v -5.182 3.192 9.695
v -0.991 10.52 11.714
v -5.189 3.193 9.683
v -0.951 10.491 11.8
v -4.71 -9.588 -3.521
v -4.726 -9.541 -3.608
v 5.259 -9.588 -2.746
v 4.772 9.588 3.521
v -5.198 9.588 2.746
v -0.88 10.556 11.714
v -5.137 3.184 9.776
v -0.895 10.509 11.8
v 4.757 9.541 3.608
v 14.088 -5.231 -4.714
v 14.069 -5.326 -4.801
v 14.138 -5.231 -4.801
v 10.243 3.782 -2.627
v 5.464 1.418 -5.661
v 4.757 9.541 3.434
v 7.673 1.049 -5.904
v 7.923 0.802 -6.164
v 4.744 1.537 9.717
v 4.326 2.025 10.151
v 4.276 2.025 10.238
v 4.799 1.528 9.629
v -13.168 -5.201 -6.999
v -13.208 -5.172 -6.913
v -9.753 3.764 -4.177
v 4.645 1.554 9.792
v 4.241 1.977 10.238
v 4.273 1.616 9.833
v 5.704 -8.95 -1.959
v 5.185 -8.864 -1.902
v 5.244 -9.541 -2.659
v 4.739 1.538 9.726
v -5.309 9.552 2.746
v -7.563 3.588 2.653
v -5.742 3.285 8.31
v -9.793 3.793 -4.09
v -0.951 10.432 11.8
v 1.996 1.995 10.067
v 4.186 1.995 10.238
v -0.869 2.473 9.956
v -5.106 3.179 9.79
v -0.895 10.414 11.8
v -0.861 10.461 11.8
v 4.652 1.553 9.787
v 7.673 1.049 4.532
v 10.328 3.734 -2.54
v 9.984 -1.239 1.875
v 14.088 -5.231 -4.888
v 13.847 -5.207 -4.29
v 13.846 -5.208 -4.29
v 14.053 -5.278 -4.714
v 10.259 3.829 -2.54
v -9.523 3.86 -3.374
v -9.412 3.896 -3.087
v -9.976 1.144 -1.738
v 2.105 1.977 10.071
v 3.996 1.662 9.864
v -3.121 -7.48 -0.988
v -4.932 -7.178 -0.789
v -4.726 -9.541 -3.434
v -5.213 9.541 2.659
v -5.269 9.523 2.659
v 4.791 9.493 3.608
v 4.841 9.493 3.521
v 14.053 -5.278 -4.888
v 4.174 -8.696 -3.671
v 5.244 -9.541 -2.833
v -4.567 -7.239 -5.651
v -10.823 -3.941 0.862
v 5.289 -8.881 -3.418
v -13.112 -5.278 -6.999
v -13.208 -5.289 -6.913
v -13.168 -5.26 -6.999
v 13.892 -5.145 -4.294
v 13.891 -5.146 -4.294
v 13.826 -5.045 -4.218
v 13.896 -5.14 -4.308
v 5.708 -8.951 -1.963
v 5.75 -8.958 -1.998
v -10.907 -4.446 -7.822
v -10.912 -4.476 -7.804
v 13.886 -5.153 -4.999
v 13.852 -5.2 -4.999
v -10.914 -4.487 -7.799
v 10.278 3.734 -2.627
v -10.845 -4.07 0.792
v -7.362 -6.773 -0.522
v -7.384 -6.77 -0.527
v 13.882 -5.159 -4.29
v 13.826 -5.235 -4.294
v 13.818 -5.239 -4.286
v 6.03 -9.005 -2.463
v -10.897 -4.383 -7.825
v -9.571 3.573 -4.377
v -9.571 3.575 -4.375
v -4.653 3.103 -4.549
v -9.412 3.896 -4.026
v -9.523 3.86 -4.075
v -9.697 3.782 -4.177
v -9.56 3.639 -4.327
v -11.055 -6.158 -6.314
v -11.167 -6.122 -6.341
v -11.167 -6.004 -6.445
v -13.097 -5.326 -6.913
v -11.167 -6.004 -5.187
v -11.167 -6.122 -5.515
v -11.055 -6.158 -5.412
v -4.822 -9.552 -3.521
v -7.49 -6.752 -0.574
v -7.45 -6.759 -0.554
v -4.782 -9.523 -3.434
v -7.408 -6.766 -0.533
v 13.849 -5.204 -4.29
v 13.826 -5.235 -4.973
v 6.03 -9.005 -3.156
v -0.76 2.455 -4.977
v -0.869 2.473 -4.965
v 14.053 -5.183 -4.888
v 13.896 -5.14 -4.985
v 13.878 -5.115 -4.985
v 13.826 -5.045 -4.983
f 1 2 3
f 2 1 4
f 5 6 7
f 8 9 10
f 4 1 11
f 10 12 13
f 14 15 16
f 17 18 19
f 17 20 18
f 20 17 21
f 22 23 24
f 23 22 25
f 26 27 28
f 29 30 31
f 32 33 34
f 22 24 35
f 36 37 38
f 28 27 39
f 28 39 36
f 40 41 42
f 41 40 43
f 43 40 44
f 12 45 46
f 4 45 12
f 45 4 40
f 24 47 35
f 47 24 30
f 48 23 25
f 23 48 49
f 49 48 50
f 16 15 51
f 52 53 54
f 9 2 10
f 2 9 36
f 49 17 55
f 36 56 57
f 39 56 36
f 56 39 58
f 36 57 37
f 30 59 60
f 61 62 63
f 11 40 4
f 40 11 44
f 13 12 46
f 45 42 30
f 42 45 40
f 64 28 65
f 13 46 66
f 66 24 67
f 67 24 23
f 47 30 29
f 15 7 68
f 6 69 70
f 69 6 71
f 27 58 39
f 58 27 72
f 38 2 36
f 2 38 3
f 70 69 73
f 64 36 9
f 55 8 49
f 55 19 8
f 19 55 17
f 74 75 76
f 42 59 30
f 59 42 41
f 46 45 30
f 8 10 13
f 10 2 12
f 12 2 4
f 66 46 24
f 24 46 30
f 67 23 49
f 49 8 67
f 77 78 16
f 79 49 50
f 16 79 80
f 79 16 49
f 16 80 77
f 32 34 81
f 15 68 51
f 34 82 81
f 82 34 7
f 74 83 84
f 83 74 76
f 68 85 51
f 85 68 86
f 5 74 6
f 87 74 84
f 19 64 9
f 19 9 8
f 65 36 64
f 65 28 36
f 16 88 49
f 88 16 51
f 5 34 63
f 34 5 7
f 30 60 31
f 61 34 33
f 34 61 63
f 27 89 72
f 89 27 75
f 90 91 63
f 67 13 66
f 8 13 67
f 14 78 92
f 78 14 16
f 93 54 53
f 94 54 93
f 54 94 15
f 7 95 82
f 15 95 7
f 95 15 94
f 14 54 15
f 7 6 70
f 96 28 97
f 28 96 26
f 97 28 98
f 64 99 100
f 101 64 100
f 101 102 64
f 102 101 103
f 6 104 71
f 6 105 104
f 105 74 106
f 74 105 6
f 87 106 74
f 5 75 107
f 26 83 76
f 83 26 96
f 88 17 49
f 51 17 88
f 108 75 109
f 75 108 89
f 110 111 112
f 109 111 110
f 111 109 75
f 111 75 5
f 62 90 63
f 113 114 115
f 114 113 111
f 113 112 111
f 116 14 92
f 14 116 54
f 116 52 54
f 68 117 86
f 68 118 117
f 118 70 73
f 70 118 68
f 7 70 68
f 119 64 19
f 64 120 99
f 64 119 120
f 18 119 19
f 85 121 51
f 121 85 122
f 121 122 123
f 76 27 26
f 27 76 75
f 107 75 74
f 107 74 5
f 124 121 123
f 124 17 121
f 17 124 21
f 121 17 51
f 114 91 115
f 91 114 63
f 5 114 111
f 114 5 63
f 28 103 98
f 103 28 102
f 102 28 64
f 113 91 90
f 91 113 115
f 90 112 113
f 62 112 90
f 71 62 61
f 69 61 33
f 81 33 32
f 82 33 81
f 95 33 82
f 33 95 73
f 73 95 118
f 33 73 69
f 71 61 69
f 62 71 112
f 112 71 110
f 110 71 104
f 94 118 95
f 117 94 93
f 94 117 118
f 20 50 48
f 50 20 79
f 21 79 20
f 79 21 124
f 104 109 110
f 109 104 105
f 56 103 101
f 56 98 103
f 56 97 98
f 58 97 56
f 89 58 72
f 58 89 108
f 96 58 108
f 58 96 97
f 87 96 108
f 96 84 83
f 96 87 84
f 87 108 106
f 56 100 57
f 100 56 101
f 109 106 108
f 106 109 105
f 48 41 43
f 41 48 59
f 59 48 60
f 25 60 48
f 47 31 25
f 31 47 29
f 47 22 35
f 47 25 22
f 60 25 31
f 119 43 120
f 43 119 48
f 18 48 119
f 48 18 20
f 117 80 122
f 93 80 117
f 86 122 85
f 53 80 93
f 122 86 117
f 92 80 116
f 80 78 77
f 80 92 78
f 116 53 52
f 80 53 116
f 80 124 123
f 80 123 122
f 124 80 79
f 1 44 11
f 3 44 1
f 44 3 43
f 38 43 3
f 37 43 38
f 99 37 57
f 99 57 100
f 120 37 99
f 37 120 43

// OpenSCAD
// Auto-generated OpenSCAD file

    inner_points = 10*[[0.599886064142325, -0.8909680205958462, -0.5000000000000165], [0.7642449049774599, 0.095432593474994, -0.500000000000021], [-1.1086099160454883, -0.6062901575962651, 0.500000000000021], [-0.9442510752103533, 0.3801104564745751, 0.5000000000000165], [0.599886064142347, -0.8909680205958453, 0.4999999999999834], [0.764244904977482, 0.09543259347499483, 0.49999999999997896], [-0.2543619259516038, -0.7486290890960565, -0.9999999999999978], [-0.09000308511646875, 0.23777152497478365, -1.0000000000000022], [-0.2543619259515596, -0.7486290890960547, 1.0000000000000022], [-0.09000308511642456, 0.23777152497478538, 0.9999999999999978], [-1.1086099160455103, -0.606290157596266, -0.49999999999997896], [-0.9442510752103753, 0.3801104564745742, -0.4999999999999834], [1.3795560477359692, -0.51398696446291, -3.397282455352979e-14], [-0.9480517821689757, -0.12614969085949718, 1.3623724356958116], [-0.948051782169036, -0.12614969085949948, -1.3623724356957776]];

    outer_points = 10*[[-1.0227603980993214, -0.3734255004598836, 0.25399717259450516], [-0.9712245325180885, 0.3734255004598836, -0.40899425795639943], [0.9712245325180885, -0.3734255004598836, 0.40899425795639943], [1.0227603980993214, 0.3734255004598836, -0.25399717259450516], [-0.47413873270521345, -0.9493249594098434, -0.3521002465068624], [-0.4226028671239805, -0.20247395849007616, -1.0150916770577671], [-0.5743895981847245, 0.20247395849007616, 0.9375931343768199], [-0.5228537326034916, 0.9493249594098434, 0.27460170382591526], [0.5228537326034916, -0.9493249594098434, -0.27460170382591526], [0.5743895981847245, -0.20247395849007616, -0.9375931343768199], [0.4226028671239805, 0.20247395849007616, 1.0150916770577671], [0.47413873270521345, 0.9493249594098434, 0.3521002465068624], [-1.312748714738331, -0.5230596990703646, -0.6912627825601987], [1.4038013919276195, -0.5230596990703646, -0.4800990258499658], [-0.09105267718928864, 1.0461193981407293, 1.1713618084101645]];

    // Convex hull for inner set (I)
    module inner_hull() {
        hull() {
            for (p = inner_points) {
                translate(p) sphere(r=0.1);
            }
        }
    }

    // Convex hull for outer set (O) minus inner hull (O \ I)
    module outer_minus_inner() {
        difference() {
            hull() {
                for (p = outer_points) {
                    translate(p) sphere(r=0.1);
                }
            }
            inner_hull(); // Subtract inner hull
        }
    }

    // Convex hull for outer set (O) minus all translated inner hulls
    module outer_minus_AllTranslationInner() {
        difference() {
            hull() {
                for (p = outer_points) {
                    translate(p) sphere(r=0.1);
                }
            }
            hull() {
                translate([0,0,50]) inner_hull();
                translate([0,0,-50]) inner_hull();
            }; // Subtract translated inner hulls
        }
    }

    // Difference between outer_minus_inner and outer_minus_AllTranslationInner
    module outer_minus_inner_diff() {
        difference() {
            // Outer minus inner
            difference() {
                hull() {
                    for (p = outer_points) {
                        translate(p) sphere(r=0.1);
                    }
                }
                inner_hull();
            }

            // Subtract Outer minus AllTranslationInner
            difference() {
                hull() {
                    for (p = outer_points) {
                        translate(p) sphere(r=0.1);
                    }
                }
                hull() {
                    translate([0,0,50]) inner_hull();
                    translate([0,0,-50]) inner_hull();
                };
            }
        }
    }

    // Rendering all with colors applied
    color([0, 1, 0, 1]) outer_minus_AllTranslationInner(); // Opaque green
    
